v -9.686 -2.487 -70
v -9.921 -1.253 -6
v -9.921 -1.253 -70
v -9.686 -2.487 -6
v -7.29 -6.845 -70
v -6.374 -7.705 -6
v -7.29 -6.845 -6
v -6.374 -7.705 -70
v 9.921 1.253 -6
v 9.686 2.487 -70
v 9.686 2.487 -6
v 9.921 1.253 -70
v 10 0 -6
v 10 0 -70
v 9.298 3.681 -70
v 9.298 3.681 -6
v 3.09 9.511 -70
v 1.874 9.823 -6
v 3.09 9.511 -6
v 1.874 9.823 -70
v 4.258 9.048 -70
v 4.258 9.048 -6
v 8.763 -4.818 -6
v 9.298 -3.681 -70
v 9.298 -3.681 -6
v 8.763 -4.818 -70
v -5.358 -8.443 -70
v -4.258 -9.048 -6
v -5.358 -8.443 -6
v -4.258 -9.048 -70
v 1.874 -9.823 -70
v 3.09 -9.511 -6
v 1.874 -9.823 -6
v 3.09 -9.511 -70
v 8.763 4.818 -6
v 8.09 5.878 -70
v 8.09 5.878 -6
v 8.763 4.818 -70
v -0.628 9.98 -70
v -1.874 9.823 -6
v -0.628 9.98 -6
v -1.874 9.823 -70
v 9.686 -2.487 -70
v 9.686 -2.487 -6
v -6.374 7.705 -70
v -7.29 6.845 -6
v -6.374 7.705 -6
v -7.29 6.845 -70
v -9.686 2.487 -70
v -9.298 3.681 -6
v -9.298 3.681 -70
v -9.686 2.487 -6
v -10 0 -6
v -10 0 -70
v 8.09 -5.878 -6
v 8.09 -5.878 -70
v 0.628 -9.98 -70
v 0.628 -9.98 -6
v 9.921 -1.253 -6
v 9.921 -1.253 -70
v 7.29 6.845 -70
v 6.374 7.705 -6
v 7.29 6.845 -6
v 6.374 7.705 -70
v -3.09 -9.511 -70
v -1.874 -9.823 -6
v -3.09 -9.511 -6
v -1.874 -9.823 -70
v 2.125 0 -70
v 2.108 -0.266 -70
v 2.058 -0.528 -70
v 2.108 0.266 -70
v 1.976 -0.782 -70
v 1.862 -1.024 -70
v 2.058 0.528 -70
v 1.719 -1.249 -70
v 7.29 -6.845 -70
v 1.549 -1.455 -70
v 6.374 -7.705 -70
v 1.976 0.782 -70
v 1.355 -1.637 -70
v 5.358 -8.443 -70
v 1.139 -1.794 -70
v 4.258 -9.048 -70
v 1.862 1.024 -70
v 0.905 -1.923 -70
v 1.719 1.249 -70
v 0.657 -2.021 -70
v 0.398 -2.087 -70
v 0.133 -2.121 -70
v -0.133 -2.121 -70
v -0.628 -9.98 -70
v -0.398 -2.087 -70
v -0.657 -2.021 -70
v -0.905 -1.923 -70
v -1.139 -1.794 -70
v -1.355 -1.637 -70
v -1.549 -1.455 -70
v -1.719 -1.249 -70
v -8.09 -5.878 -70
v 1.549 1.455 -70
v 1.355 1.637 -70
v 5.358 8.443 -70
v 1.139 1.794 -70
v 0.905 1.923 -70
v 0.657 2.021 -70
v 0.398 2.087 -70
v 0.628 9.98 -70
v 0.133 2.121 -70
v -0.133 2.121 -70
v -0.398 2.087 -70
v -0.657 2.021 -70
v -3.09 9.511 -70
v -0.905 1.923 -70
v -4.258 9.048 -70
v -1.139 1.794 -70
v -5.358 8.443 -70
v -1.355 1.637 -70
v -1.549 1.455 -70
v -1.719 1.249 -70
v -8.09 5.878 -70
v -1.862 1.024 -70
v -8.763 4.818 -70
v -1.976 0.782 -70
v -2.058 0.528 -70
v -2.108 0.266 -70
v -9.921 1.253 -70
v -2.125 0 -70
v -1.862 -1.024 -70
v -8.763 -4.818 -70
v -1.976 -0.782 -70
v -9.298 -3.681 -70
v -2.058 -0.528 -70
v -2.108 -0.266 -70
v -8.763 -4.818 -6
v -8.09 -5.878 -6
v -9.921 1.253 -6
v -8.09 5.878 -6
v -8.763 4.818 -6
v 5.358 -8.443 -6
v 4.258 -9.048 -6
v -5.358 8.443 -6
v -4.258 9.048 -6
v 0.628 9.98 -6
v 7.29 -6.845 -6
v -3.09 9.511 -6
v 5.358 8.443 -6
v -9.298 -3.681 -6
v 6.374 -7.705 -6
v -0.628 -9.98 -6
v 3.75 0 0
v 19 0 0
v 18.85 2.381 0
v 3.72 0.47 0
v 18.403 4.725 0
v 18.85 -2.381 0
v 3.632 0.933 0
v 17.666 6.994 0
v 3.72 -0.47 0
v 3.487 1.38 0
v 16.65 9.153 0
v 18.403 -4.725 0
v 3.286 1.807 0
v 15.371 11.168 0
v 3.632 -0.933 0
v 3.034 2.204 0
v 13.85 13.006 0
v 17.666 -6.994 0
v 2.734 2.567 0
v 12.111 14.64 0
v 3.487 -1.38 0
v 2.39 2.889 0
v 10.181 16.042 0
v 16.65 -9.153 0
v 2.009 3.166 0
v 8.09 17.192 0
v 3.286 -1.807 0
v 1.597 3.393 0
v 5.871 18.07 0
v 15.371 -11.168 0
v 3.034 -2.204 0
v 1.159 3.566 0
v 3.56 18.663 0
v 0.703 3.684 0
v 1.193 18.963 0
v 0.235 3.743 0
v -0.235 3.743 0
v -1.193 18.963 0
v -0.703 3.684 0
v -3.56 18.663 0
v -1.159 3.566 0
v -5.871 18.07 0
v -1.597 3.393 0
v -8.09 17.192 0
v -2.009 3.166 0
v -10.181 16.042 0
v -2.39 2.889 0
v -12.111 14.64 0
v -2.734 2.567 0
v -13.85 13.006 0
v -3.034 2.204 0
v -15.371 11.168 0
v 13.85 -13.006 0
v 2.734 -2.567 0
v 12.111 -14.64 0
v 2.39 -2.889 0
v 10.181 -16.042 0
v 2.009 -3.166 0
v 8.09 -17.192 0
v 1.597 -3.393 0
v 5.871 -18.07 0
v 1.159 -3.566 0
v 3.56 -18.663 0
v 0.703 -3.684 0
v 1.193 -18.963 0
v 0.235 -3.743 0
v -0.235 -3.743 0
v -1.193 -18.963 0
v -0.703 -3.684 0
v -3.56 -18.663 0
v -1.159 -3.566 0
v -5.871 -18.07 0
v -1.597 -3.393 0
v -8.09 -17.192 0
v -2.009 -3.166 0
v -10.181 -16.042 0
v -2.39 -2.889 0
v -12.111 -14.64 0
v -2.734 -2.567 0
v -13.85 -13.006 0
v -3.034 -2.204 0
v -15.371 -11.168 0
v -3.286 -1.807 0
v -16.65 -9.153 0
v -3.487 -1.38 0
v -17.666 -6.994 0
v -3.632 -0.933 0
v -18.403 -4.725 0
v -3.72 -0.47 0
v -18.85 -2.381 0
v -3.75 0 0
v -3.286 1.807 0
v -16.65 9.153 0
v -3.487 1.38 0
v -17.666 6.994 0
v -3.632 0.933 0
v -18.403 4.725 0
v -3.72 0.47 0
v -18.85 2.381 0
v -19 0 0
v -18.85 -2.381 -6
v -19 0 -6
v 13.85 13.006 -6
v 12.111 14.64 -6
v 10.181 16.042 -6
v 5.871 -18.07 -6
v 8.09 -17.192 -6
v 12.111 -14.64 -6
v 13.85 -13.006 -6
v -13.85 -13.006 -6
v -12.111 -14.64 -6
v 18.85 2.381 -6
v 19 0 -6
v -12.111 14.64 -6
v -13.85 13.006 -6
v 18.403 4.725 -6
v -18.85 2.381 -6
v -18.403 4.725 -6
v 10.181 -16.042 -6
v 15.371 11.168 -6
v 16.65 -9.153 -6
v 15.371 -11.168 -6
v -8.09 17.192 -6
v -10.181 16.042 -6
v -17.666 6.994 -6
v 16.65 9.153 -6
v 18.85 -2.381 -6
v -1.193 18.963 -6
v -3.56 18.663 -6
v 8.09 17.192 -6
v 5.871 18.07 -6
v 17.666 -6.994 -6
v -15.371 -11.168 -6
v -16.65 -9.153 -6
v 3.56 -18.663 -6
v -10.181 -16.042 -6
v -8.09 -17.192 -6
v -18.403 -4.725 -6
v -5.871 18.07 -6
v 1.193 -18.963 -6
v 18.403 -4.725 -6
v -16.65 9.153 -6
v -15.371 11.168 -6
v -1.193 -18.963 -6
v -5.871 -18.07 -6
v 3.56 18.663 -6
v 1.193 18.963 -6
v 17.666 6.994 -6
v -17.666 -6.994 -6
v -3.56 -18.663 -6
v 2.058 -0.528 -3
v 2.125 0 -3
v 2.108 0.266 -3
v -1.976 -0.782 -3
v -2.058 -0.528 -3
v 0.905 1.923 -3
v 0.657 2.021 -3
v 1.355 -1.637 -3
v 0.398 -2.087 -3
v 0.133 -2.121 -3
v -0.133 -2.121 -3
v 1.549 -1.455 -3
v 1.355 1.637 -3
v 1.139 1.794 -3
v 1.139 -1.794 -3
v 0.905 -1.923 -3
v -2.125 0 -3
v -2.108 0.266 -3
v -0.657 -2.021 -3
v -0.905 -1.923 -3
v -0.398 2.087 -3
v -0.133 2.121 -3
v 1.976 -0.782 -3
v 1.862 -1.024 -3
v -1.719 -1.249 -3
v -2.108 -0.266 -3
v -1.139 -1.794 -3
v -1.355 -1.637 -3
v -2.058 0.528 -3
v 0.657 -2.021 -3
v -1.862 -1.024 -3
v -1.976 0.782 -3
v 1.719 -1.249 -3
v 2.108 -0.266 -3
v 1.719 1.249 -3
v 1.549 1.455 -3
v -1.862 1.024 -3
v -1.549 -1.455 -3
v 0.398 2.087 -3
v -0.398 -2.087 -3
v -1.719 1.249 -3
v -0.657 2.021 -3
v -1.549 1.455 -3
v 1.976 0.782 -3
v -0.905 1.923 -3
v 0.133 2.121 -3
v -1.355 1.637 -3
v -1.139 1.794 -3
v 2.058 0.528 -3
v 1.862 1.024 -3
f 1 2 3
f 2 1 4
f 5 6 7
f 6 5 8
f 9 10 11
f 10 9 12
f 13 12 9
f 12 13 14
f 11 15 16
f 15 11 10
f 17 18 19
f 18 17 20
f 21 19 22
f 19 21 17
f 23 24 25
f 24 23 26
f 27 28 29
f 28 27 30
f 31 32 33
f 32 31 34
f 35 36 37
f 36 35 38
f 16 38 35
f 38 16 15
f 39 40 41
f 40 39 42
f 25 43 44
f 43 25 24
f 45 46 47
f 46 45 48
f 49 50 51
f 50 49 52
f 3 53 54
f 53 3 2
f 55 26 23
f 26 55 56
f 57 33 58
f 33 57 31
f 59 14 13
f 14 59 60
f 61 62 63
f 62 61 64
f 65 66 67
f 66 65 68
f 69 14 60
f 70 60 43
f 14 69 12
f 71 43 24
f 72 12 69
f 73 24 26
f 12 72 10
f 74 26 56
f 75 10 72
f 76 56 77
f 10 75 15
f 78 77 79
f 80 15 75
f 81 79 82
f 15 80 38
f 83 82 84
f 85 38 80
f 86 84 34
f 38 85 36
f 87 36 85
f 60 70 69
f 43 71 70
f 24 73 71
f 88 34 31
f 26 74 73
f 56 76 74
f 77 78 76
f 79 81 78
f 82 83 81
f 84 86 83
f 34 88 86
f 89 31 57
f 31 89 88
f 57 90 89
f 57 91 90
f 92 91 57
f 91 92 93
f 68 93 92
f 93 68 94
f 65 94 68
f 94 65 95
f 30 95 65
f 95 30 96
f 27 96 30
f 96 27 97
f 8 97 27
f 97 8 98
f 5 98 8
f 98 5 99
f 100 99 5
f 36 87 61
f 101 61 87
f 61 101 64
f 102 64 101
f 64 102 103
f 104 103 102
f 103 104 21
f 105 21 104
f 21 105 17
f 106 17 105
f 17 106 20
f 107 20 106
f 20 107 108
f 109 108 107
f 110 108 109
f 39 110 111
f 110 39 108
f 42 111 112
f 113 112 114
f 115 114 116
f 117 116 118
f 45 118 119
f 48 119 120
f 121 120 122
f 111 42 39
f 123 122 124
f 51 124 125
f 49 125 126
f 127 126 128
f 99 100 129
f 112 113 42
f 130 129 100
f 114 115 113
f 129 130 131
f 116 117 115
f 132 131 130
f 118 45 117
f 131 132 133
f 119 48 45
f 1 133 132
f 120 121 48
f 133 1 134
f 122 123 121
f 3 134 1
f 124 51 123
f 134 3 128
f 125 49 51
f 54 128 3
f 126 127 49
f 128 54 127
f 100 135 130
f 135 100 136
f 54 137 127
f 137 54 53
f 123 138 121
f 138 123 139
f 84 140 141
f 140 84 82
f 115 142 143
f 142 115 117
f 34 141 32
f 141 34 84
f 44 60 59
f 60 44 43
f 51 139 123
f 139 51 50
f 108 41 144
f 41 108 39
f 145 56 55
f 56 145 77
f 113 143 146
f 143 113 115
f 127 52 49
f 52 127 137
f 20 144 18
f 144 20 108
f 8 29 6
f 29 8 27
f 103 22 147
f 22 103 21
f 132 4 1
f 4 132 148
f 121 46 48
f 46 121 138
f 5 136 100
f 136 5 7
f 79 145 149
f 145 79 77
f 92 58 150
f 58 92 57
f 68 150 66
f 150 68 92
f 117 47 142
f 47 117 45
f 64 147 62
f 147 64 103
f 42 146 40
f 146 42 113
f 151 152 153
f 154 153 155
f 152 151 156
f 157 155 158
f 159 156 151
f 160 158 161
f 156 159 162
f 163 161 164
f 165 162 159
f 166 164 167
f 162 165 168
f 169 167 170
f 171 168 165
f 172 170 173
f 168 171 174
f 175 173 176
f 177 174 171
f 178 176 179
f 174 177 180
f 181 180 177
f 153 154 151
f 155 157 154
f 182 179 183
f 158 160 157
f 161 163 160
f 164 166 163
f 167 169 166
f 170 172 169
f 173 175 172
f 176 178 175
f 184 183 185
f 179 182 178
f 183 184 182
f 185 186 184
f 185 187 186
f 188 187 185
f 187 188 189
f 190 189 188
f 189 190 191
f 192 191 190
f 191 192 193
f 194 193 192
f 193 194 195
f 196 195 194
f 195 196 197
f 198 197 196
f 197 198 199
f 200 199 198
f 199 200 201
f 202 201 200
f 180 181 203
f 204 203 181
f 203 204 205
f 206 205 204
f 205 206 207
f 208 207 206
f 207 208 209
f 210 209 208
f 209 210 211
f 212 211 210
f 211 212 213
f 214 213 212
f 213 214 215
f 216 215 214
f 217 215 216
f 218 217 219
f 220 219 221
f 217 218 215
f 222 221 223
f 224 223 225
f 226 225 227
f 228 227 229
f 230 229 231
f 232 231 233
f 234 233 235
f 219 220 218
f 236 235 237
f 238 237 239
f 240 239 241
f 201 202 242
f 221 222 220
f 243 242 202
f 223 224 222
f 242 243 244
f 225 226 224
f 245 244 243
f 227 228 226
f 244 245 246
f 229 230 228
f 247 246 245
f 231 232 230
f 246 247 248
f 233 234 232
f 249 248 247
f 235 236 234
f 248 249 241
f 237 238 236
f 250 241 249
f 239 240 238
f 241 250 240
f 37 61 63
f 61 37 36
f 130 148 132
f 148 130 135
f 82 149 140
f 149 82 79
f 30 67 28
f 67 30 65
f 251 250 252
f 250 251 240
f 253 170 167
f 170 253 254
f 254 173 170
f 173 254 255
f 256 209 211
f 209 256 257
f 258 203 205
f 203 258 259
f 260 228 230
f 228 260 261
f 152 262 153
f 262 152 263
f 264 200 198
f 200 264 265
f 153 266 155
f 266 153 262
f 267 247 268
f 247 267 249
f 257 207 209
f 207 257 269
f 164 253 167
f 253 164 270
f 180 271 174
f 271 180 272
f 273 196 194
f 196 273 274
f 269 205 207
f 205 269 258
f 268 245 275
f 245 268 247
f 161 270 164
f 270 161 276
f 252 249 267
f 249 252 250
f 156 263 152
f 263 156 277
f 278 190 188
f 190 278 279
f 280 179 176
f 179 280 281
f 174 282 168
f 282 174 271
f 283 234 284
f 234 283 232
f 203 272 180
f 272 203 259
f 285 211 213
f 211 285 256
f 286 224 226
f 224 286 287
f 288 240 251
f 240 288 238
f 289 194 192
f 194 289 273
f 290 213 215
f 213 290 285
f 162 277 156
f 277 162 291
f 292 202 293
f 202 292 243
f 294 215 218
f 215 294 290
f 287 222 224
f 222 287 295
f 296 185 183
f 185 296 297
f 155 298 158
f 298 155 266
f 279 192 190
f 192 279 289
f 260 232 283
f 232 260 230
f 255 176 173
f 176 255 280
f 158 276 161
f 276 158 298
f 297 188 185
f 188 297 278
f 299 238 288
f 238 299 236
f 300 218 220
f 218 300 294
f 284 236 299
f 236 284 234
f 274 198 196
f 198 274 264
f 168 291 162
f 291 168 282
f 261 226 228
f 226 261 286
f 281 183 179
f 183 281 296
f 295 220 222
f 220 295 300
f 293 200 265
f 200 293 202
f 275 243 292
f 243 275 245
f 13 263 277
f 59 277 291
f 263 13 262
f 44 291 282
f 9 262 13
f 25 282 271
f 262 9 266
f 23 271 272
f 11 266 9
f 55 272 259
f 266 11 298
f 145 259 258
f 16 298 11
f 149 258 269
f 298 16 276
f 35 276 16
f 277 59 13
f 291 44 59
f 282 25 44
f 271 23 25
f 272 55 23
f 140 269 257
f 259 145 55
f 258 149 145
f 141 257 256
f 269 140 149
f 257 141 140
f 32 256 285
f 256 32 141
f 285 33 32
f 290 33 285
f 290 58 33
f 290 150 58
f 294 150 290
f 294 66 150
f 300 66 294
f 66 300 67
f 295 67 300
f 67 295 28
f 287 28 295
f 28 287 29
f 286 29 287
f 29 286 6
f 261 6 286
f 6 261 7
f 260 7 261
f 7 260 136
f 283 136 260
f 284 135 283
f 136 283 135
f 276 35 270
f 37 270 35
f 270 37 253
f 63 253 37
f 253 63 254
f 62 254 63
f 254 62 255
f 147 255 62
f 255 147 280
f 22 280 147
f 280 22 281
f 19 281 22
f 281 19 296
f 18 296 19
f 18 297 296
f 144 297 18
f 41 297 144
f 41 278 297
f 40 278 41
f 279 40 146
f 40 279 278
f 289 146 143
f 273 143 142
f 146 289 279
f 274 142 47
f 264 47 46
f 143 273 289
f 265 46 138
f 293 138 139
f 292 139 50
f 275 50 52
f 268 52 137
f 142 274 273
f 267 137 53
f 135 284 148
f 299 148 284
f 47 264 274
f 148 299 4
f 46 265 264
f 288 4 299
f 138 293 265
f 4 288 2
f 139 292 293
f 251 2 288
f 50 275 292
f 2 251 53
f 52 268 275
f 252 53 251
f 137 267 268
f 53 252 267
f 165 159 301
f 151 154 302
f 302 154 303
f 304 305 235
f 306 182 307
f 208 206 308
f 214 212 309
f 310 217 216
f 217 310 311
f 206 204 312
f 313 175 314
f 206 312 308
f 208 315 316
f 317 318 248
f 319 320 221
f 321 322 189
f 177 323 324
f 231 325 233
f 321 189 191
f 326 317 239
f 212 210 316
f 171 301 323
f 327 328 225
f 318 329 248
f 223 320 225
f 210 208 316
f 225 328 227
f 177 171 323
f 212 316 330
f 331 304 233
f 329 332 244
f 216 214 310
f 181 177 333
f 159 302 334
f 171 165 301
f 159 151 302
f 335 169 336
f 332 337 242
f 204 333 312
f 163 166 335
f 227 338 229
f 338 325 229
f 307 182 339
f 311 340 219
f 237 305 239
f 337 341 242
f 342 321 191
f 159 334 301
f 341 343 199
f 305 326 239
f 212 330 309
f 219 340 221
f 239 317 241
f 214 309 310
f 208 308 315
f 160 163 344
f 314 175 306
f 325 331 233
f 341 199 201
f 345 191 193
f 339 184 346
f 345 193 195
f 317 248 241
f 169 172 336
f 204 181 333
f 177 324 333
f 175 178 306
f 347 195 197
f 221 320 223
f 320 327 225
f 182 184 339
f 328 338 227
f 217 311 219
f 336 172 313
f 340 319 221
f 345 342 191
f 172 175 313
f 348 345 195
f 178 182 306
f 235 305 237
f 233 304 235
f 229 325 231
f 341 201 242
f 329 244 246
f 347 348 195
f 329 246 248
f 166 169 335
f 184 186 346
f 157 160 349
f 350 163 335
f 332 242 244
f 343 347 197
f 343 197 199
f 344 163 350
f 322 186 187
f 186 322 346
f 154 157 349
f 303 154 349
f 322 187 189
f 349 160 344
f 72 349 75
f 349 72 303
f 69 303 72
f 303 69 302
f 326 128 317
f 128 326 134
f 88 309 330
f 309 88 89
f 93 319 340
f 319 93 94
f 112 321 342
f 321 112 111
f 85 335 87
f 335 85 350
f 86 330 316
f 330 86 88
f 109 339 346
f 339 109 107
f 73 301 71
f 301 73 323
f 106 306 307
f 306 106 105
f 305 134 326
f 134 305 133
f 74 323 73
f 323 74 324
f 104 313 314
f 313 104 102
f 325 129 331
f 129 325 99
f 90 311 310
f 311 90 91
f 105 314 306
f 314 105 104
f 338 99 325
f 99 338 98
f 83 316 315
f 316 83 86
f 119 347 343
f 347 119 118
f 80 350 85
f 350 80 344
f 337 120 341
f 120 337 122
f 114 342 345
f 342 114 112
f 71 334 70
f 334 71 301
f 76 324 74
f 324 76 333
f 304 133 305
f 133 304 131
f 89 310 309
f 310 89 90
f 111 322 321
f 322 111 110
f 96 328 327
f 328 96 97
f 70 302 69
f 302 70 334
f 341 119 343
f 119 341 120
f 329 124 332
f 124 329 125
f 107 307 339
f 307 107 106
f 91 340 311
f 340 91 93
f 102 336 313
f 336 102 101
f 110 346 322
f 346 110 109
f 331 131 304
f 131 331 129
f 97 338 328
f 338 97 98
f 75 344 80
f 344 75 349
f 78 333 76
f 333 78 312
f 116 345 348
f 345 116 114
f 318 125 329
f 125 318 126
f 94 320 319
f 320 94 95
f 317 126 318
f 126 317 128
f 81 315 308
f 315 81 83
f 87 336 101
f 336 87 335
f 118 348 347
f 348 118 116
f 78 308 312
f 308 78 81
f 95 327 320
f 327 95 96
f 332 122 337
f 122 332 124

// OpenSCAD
$fn = 50;


difference() {
	union() {
		translate(v = [0, 0, -70.0000000000]) {
			cylinder(h = 70, r = 10.0000000000);
		}
		translate(v = [0, 0, -6.0000000000]) {
			cylinder(h = 6, r = 19.0000000000);
		}
	}
	union() {
		translate(v = [0, 0, 0]) {
			rotate(a = [0, 0, 0]) {
				difference() {
					union() {
						#translate(v = [0, 0, -70.0000000000]) {
							cylinder(h = 70, r = 2.0000000000);
						}
						#translate(v = [0, 0, -3]) {
							cylinder(h = 3, r = 10.0000000000, r1 = 2.1250000000, r2 = 3.7500000000);
						}
						#translate(v = [0, 0, -70.0000000000]) {
							cylinder(h = 70, r = 2.1250000000);
						}
						#translate(v = [0, 0, -70.0000000000]) {
							cylinder(h = 70, r = 2.0000000000);
						}
					}
					union();
				}
			}
		}
	}
}
